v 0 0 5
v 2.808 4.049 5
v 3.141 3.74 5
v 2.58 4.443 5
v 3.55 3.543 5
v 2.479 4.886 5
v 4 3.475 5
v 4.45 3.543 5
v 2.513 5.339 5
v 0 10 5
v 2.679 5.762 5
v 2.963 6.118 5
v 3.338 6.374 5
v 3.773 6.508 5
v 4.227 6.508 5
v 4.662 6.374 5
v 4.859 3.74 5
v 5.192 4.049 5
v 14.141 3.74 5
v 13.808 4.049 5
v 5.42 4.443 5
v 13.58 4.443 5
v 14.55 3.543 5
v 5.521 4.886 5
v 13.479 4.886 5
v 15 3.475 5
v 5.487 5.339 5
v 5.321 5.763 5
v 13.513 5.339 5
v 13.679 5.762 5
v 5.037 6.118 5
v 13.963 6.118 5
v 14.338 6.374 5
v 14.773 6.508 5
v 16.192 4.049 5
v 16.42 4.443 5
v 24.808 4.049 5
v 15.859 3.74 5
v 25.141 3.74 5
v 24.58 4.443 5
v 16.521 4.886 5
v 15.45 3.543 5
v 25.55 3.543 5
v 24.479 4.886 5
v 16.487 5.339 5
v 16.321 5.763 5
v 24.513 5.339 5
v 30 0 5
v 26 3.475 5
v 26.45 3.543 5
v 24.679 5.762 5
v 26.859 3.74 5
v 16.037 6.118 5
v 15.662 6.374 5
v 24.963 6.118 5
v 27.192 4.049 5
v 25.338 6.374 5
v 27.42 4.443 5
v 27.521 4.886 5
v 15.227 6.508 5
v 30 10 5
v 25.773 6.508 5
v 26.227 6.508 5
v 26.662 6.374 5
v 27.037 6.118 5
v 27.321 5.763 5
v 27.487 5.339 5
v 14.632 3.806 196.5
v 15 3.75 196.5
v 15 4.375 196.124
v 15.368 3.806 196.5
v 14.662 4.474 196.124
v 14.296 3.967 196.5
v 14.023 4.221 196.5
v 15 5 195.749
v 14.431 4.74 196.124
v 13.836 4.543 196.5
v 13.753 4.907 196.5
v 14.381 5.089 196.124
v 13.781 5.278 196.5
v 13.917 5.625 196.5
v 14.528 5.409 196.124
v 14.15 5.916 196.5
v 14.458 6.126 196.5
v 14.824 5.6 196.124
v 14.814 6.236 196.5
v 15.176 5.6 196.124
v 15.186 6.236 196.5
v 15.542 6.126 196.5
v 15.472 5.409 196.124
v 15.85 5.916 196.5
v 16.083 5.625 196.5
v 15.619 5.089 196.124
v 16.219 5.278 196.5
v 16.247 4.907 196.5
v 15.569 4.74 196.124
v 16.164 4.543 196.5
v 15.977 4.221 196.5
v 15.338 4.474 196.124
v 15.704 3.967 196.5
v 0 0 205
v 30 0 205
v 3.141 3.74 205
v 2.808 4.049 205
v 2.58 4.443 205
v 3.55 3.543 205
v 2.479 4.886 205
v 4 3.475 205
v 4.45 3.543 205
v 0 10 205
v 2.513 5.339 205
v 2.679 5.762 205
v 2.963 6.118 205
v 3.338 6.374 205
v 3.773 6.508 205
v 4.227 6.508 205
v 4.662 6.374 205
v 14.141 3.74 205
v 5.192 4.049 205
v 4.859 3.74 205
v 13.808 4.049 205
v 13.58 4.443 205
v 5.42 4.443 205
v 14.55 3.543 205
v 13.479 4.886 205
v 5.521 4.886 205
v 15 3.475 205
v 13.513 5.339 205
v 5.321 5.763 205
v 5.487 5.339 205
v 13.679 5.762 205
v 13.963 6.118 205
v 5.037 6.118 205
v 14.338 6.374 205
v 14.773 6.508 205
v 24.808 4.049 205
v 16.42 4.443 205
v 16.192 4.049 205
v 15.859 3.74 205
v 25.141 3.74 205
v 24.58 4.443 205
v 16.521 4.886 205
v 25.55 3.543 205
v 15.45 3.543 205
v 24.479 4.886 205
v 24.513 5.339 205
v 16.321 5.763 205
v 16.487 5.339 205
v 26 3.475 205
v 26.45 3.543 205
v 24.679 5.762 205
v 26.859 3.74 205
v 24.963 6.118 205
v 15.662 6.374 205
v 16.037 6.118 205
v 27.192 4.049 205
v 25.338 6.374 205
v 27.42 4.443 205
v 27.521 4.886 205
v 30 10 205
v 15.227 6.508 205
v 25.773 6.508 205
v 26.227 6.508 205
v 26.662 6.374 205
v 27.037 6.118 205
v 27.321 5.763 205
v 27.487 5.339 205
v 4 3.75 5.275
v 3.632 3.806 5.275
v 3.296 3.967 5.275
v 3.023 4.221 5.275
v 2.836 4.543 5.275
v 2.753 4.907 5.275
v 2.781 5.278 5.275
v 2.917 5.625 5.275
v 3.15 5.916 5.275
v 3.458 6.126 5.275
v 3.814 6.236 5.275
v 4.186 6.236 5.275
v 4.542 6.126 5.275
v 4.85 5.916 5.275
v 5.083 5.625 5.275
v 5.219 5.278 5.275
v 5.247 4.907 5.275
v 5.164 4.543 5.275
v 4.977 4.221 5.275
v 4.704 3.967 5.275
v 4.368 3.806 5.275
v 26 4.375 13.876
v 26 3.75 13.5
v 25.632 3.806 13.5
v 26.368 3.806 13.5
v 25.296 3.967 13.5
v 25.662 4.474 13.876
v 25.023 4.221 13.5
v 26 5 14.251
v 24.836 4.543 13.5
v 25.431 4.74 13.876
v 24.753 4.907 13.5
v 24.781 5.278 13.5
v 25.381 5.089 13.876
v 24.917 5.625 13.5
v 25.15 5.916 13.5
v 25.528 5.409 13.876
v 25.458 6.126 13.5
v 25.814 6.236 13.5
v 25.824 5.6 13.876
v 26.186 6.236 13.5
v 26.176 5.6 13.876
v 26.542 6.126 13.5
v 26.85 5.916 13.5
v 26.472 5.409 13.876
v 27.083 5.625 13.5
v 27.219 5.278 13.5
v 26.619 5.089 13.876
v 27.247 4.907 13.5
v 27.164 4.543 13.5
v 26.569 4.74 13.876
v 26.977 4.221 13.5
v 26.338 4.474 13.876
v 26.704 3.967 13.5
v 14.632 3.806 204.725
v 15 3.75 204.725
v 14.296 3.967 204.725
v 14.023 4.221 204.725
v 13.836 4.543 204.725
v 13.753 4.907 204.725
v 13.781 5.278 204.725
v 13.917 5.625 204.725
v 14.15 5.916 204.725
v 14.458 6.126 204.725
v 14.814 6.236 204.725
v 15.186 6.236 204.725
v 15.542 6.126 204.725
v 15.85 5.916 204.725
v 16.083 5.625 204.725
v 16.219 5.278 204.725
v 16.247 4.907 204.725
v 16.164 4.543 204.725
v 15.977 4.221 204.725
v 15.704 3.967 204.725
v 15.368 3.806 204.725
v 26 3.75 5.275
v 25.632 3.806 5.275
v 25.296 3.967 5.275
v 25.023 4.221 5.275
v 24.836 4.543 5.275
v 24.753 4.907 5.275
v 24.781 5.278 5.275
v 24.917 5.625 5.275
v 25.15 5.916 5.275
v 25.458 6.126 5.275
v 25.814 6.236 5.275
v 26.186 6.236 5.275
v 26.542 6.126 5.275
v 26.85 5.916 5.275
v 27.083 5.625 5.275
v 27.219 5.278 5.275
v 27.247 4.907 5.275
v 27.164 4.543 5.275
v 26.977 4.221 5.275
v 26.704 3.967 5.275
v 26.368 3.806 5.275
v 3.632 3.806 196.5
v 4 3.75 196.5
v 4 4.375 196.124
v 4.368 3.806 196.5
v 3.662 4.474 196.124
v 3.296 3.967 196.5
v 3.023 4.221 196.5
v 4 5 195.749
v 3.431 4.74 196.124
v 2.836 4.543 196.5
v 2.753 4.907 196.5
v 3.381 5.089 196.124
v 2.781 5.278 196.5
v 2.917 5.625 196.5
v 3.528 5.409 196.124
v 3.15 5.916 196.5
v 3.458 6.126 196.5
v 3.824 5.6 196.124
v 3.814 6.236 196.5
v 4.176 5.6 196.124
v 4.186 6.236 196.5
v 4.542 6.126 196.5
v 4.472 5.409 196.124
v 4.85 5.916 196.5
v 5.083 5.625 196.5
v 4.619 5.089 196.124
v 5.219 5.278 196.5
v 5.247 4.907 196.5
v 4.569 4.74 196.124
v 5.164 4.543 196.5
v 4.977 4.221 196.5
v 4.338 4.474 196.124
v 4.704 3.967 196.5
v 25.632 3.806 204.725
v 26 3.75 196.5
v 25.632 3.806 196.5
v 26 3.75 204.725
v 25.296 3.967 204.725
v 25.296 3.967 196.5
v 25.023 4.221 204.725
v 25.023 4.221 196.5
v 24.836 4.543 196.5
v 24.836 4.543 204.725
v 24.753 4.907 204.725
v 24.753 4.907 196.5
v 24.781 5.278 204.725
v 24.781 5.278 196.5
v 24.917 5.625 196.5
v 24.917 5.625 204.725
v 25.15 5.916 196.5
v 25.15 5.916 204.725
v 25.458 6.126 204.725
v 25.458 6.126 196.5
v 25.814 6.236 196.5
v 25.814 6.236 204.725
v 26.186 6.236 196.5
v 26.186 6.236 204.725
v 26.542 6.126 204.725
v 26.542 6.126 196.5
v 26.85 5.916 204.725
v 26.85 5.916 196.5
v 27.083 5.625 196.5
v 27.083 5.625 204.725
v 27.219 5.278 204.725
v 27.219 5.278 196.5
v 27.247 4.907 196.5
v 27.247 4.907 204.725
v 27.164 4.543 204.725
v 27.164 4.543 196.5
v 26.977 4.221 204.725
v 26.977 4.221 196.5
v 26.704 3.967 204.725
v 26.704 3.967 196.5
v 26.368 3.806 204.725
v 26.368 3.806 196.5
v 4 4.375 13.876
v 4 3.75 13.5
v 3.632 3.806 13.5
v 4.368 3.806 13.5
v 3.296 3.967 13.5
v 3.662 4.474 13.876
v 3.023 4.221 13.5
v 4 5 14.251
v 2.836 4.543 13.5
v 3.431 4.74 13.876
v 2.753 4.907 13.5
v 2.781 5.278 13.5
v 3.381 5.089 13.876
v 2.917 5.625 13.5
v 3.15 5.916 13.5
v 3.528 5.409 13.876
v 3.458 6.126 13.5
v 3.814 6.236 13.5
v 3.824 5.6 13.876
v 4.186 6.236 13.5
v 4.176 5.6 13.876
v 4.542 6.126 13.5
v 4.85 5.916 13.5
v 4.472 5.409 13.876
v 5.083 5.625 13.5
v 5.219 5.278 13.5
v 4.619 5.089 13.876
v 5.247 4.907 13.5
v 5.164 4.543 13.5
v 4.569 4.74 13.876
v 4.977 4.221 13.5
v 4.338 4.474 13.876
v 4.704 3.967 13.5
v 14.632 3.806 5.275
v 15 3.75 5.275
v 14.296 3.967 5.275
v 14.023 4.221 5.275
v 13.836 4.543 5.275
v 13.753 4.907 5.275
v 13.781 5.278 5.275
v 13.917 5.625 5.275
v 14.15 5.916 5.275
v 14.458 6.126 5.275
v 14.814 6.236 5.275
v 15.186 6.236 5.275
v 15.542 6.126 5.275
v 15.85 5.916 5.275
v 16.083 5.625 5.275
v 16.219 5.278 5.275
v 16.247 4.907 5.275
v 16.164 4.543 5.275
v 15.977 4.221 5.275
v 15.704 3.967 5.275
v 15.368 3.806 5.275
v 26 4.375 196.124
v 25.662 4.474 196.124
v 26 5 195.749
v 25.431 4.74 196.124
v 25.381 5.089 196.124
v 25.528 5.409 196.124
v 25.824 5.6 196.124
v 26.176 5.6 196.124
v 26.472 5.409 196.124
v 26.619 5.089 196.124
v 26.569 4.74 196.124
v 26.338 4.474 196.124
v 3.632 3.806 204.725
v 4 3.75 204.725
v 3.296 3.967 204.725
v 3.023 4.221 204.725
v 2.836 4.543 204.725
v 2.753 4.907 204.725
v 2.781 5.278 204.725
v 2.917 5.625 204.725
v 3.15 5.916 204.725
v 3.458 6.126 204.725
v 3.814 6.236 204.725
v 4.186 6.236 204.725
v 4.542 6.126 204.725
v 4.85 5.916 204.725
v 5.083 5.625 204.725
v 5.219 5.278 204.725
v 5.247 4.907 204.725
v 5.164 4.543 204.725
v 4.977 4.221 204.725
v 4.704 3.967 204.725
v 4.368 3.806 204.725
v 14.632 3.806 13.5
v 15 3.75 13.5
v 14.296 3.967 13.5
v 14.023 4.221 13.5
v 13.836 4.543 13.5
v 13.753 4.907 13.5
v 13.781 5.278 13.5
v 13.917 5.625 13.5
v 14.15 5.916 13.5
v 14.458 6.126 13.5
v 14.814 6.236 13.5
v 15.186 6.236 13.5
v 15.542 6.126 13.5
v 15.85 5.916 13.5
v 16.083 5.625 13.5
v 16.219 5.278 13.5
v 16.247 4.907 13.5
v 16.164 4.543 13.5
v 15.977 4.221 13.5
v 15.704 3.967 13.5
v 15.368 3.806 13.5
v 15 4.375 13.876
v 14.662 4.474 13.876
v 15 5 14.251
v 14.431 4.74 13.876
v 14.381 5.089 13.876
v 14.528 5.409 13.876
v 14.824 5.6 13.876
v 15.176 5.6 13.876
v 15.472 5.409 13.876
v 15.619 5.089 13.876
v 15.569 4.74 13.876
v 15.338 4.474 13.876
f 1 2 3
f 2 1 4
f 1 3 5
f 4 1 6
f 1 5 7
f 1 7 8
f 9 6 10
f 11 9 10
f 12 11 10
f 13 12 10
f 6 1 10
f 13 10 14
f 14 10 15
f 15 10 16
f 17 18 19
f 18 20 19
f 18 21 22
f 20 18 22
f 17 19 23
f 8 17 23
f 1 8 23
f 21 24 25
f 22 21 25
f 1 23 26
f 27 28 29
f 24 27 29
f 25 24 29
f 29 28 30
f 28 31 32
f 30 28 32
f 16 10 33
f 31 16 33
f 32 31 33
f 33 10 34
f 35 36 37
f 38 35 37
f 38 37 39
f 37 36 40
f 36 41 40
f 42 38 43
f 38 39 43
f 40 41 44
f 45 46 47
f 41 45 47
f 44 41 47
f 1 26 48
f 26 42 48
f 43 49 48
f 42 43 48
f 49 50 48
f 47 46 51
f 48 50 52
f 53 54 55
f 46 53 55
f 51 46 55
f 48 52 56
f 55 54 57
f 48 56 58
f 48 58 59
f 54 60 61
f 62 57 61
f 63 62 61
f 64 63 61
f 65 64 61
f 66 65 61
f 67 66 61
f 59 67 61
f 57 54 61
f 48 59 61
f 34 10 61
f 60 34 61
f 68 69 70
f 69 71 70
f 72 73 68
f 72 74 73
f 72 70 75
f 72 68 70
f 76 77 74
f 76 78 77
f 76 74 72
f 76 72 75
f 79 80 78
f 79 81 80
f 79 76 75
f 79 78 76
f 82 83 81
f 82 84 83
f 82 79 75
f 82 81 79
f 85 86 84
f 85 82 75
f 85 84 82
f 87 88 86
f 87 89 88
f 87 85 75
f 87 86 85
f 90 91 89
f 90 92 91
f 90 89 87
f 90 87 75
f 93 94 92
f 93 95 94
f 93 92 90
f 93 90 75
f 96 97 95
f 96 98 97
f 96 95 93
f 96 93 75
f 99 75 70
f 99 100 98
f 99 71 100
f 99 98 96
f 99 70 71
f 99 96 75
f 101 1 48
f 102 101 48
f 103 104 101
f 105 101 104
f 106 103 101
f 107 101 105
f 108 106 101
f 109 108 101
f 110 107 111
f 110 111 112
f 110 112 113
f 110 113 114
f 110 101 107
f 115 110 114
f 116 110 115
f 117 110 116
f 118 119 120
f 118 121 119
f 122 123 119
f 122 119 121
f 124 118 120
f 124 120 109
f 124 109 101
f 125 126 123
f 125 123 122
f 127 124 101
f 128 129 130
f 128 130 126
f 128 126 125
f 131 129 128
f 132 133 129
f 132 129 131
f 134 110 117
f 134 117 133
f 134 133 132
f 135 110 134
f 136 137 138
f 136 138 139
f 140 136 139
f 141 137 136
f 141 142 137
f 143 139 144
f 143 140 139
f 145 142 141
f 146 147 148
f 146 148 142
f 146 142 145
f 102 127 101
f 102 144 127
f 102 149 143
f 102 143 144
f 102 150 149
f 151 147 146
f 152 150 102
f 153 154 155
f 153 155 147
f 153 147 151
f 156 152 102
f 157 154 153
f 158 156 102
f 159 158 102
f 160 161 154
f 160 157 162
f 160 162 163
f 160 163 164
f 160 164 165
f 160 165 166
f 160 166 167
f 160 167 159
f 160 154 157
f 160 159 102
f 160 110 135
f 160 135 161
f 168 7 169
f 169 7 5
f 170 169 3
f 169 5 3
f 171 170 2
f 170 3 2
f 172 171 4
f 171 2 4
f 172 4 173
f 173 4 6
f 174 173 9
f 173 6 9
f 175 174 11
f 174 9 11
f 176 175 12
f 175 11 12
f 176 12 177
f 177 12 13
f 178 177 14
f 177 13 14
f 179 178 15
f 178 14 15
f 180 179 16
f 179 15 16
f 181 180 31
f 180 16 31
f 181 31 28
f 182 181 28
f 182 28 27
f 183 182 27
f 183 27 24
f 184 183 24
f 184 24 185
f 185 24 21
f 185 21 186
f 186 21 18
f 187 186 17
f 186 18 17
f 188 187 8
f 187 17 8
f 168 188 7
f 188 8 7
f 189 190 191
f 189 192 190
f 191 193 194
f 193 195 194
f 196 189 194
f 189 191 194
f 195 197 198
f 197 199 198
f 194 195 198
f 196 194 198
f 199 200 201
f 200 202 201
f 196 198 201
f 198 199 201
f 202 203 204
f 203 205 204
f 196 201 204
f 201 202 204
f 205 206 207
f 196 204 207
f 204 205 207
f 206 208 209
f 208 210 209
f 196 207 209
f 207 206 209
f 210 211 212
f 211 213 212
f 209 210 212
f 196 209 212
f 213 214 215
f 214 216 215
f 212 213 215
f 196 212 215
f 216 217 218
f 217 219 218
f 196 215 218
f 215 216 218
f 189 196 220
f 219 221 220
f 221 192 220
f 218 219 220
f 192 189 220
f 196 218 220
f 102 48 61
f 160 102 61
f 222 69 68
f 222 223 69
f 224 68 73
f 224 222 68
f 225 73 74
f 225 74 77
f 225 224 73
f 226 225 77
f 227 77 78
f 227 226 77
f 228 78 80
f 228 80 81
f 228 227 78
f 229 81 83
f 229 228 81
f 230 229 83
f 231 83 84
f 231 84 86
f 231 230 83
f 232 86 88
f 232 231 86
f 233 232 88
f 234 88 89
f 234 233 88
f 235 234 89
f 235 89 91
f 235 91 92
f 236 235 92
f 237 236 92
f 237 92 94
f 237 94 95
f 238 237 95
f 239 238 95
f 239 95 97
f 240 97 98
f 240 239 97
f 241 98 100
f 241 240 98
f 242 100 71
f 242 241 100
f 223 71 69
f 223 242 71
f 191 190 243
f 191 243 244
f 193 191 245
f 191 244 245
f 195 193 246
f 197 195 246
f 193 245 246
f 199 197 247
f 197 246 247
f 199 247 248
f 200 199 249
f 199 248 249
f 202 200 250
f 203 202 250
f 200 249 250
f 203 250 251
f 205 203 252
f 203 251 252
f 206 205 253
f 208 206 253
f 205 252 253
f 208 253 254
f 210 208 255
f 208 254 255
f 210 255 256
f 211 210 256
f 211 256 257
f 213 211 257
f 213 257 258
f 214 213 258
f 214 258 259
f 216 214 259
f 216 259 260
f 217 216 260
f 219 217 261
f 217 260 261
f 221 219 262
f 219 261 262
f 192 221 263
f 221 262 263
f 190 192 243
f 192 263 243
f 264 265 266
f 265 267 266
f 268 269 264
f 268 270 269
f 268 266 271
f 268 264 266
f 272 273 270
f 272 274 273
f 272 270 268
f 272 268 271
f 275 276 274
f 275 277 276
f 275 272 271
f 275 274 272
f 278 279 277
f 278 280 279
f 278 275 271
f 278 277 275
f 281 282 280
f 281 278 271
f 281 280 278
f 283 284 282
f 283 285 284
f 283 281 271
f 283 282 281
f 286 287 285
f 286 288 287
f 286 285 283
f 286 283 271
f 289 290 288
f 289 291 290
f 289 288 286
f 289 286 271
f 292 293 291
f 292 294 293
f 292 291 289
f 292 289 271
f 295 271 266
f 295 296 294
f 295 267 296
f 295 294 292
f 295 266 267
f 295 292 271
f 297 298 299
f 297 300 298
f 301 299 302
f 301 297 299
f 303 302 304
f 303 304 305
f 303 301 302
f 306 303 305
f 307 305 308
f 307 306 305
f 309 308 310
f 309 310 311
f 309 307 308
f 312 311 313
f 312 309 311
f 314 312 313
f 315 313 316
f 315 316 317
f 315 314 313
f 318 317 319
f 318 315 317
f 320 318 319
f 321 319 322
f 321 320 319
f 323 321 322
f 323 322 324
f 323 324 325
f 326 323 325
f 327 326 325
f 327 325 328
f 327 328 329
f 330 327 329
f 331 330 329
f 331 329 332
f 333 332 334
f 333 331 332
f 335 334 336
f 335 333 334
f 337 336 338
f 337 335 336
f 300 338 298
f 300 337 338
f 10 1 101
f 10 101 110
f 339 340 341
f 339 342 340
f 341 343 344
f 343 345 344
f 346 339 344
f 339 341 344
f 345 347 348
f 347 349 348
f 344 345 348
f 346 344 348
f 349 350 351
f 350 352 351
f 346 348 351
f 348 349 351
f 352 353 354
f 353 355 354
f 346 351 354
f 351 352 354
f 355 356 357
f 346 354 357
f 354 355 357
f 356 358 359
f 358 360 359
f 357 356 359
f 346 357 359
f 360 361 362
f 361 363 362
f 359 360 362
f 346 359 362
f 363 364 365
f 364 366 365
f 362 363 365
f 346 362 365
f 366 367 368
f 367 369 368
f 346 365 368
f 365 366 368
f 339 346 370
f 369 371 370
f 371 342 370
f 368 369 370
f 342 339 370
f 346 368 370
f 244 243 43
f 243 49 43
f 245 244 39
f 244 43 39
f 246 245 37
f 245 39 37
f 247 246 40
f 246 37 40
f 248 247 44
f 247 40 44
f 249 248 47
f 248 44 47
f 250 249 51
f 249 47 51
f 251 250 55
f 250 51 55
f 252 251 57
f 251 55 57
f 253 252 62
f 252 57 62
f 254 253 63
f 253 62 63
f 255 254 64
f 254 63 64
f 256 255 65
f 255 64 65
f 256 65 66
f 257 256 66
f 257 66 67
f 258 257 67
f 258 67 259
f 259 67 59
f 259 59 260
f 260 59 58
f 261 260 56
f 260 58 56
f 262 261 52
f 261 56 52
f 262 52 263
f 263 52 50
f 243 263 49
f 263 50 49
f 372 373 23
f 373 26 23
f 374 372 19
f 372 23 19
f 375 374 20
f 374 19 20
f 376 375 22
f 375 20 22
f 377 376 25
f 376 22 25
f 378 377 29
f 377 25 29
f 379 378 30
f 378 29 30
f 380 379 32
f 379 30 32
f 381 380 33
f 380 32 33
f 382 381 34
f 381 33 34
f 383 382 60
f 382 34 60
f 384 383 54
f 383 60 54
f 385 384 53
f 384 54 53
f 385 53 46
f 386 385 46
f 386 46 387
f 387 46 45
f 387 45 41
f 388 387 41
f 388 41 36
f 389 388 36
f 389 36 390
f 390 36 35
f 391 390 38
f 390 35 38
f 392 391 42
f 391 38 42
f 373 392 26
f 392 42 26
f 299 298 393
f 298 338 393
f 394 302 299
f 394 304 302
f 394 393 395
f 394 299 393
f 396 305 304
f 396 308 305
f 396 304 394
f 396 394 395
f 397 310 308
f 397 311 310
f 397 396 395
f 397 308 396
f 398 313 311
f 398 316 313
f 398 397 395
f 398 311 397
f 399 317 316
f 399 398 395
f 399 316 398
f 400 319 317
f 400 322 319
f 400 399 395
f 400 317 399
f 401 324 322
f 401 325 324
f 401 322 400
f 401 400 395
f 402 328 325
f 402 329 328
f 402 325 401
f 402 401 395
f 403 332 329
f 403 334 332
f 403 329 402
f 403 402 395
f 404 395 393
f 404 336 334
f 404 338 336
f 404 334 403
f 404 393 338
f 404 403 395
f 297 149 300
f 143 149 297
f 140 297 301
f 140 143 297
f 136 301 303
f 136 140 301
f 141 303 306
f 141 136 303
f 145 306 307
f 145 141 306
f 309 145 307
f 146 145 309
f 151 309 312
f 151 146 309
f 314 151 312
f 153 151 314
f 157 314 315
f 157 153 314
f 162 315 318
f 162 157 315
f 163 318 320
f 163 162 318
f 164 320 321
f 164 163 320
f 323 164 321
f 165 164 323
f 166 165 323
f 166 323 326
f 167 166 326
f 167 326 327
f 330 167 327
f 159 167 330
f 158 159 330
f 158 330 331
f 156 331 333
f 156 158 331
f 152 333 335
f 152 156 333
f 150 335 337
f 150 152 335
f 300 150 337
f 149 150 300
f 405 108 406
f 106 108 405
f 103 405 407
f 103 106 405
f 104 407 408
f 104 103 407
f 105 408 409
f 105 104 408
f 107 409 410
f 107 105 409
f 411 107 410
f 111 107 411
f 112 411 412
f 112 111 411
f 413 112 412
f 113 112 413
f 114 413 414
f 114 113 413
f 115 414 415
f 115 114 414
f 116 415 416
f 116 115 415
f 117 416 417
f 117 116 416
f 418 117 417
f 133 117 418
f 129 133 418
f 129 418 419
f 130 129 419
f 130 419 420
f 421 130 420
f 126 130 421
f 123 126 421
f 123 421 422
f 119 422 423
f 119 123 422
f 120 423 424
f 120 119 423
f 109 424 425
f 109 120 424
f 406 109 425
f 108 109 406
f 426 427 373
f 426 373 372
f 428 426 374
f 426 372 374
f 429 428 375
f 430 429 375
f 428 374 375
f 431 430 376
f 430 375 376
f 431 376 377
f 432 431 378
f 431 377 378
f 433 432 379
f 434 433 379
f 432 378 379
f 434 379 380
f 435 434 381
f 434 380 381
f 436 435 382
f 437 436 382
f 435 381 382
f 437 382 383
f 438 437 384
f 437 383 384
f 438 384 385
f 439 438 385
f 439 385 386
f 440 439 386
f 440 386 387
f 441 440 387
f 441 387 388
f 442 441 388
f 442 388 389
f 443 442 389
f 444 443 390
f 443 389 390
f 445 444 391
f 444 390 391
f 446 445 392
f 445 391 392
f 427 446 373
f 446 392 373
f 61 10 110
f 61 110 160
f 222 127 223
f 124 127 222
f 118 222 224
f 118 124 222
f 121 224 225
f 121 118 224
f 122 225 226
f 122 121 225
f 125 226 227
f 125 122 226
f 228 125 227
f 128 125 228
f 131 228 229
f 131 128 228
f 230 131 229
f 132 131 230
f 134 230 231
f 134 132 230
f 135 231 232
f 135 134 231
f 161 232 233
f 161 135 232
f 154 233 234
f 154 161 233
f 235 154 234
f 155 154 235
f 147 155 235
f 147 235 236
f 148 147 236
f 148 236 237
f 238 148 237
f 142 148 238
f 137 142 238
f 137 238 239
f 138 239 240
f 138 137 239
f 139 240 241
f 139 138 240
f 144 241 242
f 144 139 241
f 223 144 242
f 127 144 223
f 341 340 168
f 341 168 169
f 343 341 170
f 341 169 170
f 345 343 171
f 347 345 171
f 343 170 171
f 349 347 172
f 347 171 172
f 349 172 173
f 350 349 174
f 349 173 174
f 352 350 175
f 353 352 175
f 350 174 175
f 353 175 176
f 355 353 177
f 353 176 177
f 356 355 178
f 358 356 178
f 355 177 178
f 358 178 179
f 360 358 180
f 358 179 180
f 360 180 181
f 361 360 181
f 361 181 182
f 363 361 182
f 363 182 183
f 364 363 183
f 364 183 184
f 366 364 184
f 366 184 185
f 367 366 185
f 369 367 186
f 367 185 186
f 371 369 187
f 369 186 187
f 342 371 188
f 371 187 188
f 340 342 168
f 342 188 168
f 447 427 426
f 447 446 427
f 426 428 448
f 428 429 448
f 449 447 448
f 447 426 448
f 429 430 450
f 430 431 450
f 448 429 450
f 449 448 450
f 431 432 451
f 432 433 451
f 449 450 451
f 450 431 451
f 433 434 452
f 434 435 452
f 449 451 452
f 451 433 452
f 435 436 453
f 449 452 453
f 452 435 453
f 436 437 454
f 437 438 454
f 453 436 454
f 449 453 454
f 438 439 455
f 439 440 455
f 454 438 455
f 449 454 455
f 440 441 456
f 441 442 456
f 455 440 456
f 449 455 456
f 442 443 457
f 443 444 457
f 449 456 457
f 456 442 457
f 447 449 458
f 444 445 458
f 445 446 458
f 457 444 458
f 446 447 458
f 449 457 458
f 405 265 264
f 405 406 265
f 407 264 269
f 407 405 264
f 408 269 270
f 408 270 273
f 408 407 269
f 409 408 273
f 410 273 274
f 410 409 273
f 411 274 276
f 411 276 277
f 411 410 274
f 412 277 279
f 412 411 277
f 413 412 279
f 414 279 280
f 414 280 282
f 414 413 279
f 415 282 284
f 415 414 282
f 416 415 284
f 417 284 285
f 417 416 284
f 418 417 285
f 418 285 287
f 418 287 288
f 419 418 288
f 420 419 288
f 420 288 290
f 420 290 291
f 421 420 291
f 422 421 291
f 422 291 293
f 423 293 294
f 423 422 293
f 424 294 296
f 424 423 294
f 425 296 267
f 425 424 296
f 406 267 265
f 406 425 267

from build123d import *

# Parameters (mm, degrees)
SKETCH1_W                  = 30
SKETCH1_H                  = 10
BOSS_EXTRUDE1_DEPTH        = 210
SKETCH3_W                  = 30
SKETCH3_H                  = 5
CUT_EXTRUDE3_DEPTH         = 10
M3_TAPPED_HOLE1_AT_2_COUNT = 2
M3_TAPPED_HOLE1_AT_2_PITCH = 11
M3_TAPPED_HOLE1_AT_3_COUNT = 2
M3_TAPPED_HOLE1_AT_3_PITCH = 22


with BuildPart() as part:
    # Sketch1 → Boss-Extrude1 (new body)
    with BuildSketch(Plane.XY):
        with Locations((15, 5)):
            Rectangle(SKETCH1_W, SKETCH1_H)
    extrude(amount=BOSS_EXTRUDE1_DEPTH)

    # Sketch3 → Cut-Extrude3 (cut)
    with BuildSketch(Plane(origin=(0, 10, 0), x_dir=(1, 0, 0), z_dir=(0, 1, 0))):
        with Locations((15, -207.5)):
            Rectangle(SKETCH3_W, SKETCH3_H)
    cut_extrude3 = extrude(amount=-CUT_EXTRUDE3_DEPTH, mode=Mode.SUBTRACT)

    # Mirror2: Cut-Extrude3 across plane
    add(cut_extrude3.mirror(Plane(origin=(0, 0, 105), x_dir=(1, 0, 0), z_dir=(0, 0, -1))), mode=Mode.SUBTRACT)

    # Sketch6 → M3 Tapped Hole1 (revolve, cut)
    with BuildSketch(Plane(origin=(4, 5, 205), x_dir=(0, -1, 0), z_dir=(1, 0, 0))):
        Polygon((0, 0), (0, 9.251075774), (1.25, 8.5), (1.25, 0.275), (1.525, 0), align=None)
    m3_tapped_hole1 = revolve(axis=Axis((4, 5, 211.35), (0, 0, -1)), mode=Mode.SUBTRACT)

    # M3 Tapped Hole1 at 2: M3 Tapped Hole1 ×2
    with Locations(*[(i * M3_TAPPED_HOLE1_AT_2_PITCH, 0, 0) for i in range(1, M3_TAPPED_HOLE1_AT_2_COUNT)]):
        add(m3_tapped_hole1, mode=Mode.SUBTRACT)

    # M3 Tapped Hole1 at 3: M3 Tapped Hole1 ×2
    with Locations(*[(i * M3_TAPPED_HOLE1_AT_3_PITCH, 0, 0) for i in range(1, M3_TAPPED_HOLE1_AT_3_COUNT)]):
        add(m3_tapped_hole1, mode=Mode.SUBTRACT)

    # Mirror3: M3 Tapped Hole1 across plane
    add(m3_tapped_hole1.mirror(Plane.XY.offset(105)), mode=Mode.SUBTRACT)

    # Mirror3 copy 1 sketch → Mirror3 copy 1 (revolve, cut)
    with BuildSketch(Plane(origin=(15, 5, 5), x_dir=(0, -1, 0), z_dir=(1, 0, 0))):
        Polygon((0, 0), (0, -9.251075774), (1.25, -8.5), (1.25, -0.275), (1.525, 0), align=None)
    revolve(axis=Axis((15, 5, -1.35), (0, 0, -1)), mode=Mode.SUBTRACT)

    # Mirror3 copy 2 sketch → Mirror3 copy 2 (revolve, cut)
    with BuildSketch(Plane(origin=(26, 5, 5), x_dir=(0, -1, 0), z_dir=(1, 0, 0))):
        Polygon((0, 0), (0, -9.251075774), (1.25, -8.5), (1.25, -0.275), (1.525, 0), align=None)
    revolve(axis=Axis((26, 5, -1.35), (0, 0, -1)), mode=Mode.SUBTRACT)


solid = part.part
